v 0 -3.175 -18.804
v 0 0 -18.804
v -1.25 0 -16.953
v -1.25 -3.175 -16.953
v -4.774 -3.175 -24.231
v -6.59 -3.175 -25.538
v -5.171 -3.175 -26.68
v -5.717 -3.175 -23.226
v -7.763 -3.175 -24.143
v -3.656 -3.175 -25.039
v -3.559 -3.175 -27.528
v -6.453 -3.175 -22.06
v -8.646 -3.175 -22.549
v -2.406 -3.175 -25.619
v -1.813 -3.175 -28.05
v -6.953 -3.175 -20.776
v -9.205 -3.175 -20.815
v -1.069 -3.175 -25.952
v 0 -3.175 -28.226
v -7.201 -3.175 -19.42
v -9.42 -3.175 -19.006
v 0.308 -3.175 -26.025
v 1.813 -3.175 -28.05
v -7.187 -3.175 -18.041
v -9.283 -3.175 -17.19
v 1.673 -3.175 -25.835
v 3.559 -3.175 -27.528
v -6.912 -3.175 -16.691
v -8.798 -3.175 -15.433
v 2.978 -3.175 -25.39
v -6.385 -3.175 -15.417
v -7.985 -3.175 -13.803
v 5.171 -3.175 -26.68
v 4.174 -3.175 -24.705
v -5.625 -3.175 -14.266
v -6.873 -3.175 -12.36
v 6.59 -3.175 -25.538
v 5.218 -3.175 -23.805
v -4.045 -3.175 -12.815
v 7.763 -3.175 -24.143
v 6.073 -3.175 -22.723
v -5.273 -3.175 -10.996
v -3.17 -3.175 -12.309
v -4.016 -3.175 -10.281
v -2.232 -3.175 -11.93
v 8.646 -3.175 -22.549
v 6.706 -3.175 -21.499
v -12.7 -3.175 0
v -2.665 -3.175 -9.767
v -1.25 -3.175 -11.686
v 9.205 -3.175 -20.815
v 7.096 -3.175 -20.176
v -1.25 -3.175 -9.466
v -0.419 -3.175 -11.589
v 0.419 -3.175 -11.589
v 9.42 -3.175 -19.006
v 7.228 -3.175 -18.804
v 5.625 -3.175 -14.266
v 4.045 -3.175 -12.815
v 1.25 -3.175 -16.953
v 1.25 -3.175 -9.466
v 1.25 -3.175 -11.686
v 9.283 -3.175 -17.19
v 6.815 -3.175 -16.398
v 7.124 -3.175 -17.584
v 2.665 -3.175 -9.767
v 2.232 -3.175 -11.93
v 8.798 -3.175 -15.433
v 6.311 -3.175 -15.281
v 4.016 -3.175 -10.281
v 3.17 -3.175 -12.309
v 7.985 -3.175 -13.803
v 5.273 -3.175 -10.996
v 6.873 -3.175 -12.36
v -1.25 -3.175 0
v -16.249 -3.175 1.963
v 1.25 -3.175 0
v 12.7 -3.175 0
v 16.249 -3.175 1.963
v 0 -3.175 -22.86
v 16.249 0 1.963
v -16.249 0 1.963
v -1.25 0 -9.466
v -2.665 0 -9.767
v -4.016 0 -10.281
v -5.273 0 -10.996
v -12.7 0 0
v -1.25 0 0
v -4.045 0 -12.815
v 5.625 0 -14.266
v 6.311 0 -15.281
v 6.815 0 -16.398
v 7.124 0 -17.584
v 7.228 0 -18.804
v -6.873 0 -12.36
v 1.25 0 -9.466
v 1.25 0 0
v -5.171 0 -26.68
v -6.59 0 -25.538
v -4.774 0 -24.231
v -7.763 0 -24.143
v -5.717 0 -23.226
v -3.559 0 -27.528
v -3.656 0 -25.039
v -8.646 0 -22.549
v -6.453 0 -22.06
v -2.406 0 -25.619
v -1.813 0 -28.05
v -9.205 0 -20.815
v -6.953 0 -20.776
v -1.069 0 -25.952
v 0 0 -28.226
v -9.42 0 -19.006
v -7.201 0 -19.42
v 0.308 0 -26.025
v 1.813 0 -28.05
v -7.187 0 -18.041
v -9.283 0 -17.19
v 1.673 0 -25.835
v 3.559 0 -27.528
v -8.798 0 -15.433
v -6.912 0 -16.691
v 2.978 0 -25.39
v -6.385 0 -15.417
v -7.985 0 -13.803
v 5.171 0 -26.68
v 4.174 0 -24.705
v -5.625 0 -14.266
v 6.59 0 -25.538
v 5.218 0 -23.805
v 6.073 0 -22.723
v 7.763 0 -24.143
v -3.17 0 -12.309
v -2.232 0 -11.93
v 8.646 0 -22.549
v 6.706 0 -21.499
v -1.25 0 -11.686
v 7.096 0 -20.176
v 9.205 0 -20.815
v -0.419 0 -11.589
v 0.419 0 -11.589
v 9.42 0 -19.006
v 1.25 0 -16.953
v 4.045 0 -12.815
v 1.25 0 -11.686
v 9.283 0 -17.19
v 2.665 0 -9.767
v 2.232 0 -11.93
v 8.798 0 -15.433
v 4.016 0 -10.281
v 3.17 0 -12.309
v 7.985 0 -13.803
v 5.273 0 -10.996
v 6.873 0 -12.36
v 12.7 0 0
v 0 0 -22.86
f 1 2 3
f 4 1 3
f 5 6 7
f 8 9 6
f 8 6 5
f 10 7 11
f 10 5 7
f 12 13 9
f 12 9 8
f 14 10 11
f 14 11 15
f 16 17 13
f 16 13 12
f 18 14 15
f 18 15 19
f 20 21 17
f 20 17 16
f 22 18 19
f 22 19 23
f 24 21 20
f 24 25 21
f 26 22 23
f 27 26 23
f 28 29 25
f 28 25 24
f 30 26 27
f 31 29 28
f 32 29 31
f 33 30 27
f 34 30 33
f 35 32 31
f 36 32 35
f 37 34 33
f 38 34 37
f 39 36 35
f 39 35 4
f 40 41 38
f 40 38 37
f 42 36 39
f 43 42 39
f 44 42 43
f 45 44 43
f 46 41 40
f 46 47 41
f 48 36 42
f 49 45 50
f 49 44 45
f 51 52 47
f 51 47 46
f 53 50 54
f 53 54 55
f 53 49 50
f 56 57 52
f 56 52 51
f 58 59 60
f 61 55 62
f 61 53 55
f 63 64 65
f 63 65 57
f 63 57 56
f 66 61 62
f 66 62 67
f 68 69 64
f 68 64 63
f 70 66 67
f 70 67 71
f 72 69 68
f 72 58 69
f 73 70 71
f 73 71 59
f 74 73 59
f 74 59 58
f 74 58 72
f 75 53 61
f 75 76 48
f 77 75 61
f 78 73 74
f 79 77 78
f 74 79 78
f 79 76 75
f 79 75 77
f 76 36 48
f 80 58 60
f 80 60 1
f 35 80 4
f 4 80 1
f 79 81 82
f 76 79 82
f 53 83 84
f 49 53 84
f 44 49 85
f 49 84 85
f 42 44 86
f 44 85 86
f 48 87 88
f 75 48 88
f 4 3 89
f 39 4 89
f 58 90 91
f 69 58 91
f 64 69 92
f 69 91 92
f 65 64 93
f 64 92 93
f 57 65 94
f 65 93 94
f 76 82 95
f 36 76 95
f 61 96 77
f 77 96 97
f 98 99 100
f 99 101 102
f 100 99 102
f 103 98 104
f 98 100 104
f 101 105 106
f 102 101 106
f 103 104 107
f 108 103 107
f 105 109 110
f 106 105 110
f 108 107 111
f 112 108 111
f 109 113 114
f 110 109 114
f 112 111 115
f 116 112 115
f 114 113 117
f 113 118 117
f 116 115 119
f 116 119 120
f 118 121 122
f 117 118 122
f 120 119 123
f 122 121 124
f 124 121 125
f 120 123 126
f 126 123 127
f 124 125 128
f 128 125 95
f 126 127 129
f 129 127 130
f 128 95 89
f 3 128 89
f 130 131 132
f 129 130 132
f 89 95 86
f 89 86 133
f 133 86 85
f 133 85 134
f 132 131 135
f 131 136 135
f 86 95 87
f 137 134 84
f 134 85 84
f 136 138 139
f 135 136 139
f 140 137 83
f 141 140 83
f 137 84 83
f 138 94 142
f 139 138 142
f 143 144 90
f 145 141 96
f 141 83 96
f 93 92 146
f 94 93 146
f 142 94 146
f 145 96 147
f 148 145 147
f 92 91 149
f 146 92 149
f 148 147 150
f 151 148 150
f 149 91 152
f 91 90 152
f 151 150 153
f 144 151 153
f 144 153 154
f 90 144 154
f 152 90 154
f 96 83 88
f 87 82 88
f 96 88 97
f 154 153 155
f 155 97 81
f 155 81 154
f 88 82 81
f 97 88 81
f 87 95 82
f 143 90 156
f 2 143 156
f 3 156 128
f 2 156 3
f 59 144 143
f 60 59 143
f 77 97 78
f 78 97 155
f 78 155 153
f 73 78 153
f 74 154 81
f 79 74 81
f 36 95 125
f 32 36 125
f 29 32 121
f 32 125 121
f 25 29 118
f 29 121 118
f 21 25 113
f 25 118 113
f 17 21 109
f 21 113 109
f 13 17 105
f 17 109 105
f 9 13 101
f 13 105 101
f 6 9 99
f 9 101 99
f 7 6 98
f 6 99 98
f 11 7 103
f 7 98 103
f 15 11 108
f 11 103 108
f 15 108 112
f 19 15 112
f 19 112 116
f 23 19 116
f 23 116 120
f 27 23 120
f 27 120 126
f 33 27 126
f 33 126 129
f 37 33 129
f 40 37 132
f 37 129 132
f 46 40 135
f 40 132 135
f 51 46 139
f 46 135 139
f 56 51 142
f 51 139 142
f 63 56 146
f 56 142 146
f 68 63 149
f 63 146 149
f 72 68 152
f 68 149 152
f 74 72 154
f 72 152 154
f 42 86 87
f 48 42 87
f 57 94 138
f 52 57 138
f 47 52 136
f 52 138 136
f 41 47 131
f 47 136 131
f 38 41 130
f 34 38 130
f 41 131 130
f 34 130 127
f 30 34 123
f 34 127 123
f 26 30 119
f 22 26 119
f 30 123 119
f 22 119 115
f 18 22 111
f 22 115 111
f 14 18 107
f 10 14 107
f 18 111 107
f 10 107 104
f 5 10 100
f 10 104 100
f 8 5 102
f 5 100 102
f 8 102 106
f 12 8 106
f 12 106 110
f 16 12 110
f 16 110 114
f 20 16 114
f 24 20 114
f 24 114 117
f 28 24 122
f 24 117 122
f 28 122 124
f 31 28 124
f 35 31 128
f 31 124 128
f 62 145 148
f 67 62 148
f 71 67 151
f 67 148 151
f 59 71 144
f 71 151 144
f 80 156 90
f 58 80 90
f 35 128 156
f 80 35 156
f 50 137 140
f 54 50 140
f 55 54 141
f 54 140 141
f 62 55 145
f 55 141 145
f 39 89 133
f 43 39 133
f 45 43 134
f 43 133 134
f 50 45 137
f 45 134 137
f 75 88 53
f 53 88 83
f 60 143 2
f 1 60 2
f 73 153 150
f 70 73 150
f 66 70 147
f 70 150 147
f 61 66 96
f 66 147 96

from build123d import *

# Parameters (mm, degrees)
F1_DEPTH = 3.175


with BuildPart() as f1:
    # F0 (on Front) → F1 (new body)
    with BuildSketch(Plane.XZ):
        Polygon((-1.2503195478, 0), (0, 0), (0, 1.9634975899), (-16.2488400529, 1.9634975899), (-12.7, 0), align=None)
        Polygon((0, 1.9634975899), (0, 0), (1.2503195478, 0), (12.7, 0), (16.2488400529, 1.9634975899), align=None)
        with BuildLine():
            Line((16.2488400529, 1.9634975899), (12.7, 0))
            Line((12.7, 0), (5.273375106, -10.9961956262))
            ThreePointArc((5.273375106, -10.9961956262), (6.1114552938, -11.6331804071), (6.8732481888, -12.3596785818))
            Line((6.8732481888, -12.3596785818), (16.2488400529, 1.9634975899))
        make_face()
        with BuildLine():
            Line((-5.273375106, -10.9961956262), (-12.7, 0))
            Line((-12.7, 0), (-16.2488400529, 1.9634975899))
            Line((-16.2488400529, 1.9634975899), (-6.8732481888, -12.3596785818))
            ThreePointArc((-6.8732481888, -12.3596785818), (-6.1114552938, -11.6331804071), (-5.273375106, -10.9961956262))
        make_face()
        with BuildLine():
            Line((1.2503195478, 0), (0, 0))
            Line((0, 0), (-1.2503195478, 0))
            Line((-1.2503195478, 0), (-1.2503195478, -9.4655629921))
            ThreePointArc((-1.2503195478, -9.4655629921), (0, -9.3822341022), (1.2503195478, -9.4655629921))
            Line((1.2503195478, -9.4655629921), (1.2503195478, 0))
        make_face()
        with BuildLine():
            Line((1.2503195478, -11.6856056581), (1.2503195478, -9.4655629921))
            ThreePointArc((1.2503195478, -9.4655629921), (0, -9.3822341022), (-1.2503195478, -9.4655629921))
            Line((-1.2503195478, -9.4655629921), (-1.2503195478, -11.6856056581))
            ThreePointArc((-1.2503195478, -11.6856056581), (0, -11.5766356799), (1.2503195478, -11.6856056581))
        make_face()
        with BuildLine():
            Line((-1.2503195478, -11.6856056581), (-1.2503195478, -9.4655629921))
            ThreePointArc((-1.2503195478, -9.4655629921), (-3.3504263981, -9.9980615076), (-5.273375106, -10.9961956262))
            Line((-5.273375106, -10.9961956262), (-4.0451906764, -12.8147008617))
            ThreePointArc((-4.0451906764, -12.8147008617), (-2.7072718978, -12.1028302128), (-1.2503195478, -11.6856056581))
        make_face()
        with BuildLine():
            Line((-4.0451906764, -12.8147008617), (-5.273375106, -10.9961956262))
            ThreePointArc((-5.273375106, -10.9961956262), (-6.1114552938, -11.6331804071), (-6.8732481888, -12.3596785818))
            Line((-6.8732481888, -12.3596785818), (-5.6253009067, -14.2661788895))
            ThreePointArc((-5.6253009067, -14.2661788895), (-4.8894068128, -13.4814790218), (-4.0451906764, -12.8147008617))
        make_face()
        with BuildLine():
            Line((-5.6253009067, -14.2661788895), (-6.8732481888, -12.3596785818))
            ThreePointArc((-6.8732481888, -12.3596785818), (-3.4651004367, -27.5658350731), (9.4219584409, -18.804192543))
            ThreePointArc((9.4219584409, -18.804192543), (8.7616425301, -15.3390921063), (6.8732481888, -12.3596785818))
            Line((6.8732481888, -12.3596785818), (5.6253009067, -14.2661788895))
            ThreePointArc((5.6253009067, -14.2661788895), (6.8152314849, -16.3979095137), (7.2275568631, -18.804192543))
            ThreePointArc((7.2275568631, -18.804192543), (-2.4062830293, -25.6194240279), (-5.6253009067, -14.2661788895))
        make_face()
        with BuildLine():
            Line((-1.2503195478, -16.9529130534), (-4.0451906764, -12.8147008617))
            ThreePointArc((-4.0451906764, -12.8147008617), (-4.8894068128, -13.4814790218), (-5.6253009067, -14.2661788895))
            Line((-5.6253009067, -14.2661788895), (0, -22.8600017726))
            Line((0, -22.8600017726), (0, -18.804192543))
            Line((0, -18.804192543), (-1.2503195478, -16.9529130534))
        make_face()
        with BuildLine():
            ThreePointArc((5.6253009067, -14.2661788895), (4.8894068128, -13.4814790218), (4.0451906764, -12.8147008617))
            Line((4.0451906764, -12.8147008617), (1.2503195478, -16.9529130534))
            Line((1.2503195478, -16.9529130534), (0, -18.804192543))
            Line((0, -18.804192543), (0, -22.8600017726))
            Line((0, -22.8600017726), (5.6253009067, -14.2661788895))
        make_face()
        with BuildLine():
            ThreePointArc((5.273375106, -10.9961956262), (3.3504263981, -9.9980615076), (1.2503195478, -9.4655629921))
            Line((1.2503195478, -9.4655629921), (1.2503195478, -11.6856056581))
            ThreePointArc((1.2503195478, -11.6856056581), (2.7072718978, -12.1028302128), (4.0451906764, -12.8147008617))
            Line((4.0451906764, -12.8147008617), (5.273375106, -10.9961956262))
        make_face()
        with BuildLine():
            ThreePointArc((6.8732481888, -12.3596785818), (6.1114552938, -11.6331804071), (5.273375106, -10.9961956262))
            Line((5.273375106, -10.9961956262), (4.0451906764, -12.8147008617))
            ThreePointArc((4.0451906764, -12.8147008617), (4.8894068128, -13.4814790218), (5.6253009067, -14.2661788895))
            Line((5.6253009067, -14.2661788895), (6.8732481888, -12.3596785818))
        make_face()
    extrude(amount=F1_DEPTH)


solid = f1.part
